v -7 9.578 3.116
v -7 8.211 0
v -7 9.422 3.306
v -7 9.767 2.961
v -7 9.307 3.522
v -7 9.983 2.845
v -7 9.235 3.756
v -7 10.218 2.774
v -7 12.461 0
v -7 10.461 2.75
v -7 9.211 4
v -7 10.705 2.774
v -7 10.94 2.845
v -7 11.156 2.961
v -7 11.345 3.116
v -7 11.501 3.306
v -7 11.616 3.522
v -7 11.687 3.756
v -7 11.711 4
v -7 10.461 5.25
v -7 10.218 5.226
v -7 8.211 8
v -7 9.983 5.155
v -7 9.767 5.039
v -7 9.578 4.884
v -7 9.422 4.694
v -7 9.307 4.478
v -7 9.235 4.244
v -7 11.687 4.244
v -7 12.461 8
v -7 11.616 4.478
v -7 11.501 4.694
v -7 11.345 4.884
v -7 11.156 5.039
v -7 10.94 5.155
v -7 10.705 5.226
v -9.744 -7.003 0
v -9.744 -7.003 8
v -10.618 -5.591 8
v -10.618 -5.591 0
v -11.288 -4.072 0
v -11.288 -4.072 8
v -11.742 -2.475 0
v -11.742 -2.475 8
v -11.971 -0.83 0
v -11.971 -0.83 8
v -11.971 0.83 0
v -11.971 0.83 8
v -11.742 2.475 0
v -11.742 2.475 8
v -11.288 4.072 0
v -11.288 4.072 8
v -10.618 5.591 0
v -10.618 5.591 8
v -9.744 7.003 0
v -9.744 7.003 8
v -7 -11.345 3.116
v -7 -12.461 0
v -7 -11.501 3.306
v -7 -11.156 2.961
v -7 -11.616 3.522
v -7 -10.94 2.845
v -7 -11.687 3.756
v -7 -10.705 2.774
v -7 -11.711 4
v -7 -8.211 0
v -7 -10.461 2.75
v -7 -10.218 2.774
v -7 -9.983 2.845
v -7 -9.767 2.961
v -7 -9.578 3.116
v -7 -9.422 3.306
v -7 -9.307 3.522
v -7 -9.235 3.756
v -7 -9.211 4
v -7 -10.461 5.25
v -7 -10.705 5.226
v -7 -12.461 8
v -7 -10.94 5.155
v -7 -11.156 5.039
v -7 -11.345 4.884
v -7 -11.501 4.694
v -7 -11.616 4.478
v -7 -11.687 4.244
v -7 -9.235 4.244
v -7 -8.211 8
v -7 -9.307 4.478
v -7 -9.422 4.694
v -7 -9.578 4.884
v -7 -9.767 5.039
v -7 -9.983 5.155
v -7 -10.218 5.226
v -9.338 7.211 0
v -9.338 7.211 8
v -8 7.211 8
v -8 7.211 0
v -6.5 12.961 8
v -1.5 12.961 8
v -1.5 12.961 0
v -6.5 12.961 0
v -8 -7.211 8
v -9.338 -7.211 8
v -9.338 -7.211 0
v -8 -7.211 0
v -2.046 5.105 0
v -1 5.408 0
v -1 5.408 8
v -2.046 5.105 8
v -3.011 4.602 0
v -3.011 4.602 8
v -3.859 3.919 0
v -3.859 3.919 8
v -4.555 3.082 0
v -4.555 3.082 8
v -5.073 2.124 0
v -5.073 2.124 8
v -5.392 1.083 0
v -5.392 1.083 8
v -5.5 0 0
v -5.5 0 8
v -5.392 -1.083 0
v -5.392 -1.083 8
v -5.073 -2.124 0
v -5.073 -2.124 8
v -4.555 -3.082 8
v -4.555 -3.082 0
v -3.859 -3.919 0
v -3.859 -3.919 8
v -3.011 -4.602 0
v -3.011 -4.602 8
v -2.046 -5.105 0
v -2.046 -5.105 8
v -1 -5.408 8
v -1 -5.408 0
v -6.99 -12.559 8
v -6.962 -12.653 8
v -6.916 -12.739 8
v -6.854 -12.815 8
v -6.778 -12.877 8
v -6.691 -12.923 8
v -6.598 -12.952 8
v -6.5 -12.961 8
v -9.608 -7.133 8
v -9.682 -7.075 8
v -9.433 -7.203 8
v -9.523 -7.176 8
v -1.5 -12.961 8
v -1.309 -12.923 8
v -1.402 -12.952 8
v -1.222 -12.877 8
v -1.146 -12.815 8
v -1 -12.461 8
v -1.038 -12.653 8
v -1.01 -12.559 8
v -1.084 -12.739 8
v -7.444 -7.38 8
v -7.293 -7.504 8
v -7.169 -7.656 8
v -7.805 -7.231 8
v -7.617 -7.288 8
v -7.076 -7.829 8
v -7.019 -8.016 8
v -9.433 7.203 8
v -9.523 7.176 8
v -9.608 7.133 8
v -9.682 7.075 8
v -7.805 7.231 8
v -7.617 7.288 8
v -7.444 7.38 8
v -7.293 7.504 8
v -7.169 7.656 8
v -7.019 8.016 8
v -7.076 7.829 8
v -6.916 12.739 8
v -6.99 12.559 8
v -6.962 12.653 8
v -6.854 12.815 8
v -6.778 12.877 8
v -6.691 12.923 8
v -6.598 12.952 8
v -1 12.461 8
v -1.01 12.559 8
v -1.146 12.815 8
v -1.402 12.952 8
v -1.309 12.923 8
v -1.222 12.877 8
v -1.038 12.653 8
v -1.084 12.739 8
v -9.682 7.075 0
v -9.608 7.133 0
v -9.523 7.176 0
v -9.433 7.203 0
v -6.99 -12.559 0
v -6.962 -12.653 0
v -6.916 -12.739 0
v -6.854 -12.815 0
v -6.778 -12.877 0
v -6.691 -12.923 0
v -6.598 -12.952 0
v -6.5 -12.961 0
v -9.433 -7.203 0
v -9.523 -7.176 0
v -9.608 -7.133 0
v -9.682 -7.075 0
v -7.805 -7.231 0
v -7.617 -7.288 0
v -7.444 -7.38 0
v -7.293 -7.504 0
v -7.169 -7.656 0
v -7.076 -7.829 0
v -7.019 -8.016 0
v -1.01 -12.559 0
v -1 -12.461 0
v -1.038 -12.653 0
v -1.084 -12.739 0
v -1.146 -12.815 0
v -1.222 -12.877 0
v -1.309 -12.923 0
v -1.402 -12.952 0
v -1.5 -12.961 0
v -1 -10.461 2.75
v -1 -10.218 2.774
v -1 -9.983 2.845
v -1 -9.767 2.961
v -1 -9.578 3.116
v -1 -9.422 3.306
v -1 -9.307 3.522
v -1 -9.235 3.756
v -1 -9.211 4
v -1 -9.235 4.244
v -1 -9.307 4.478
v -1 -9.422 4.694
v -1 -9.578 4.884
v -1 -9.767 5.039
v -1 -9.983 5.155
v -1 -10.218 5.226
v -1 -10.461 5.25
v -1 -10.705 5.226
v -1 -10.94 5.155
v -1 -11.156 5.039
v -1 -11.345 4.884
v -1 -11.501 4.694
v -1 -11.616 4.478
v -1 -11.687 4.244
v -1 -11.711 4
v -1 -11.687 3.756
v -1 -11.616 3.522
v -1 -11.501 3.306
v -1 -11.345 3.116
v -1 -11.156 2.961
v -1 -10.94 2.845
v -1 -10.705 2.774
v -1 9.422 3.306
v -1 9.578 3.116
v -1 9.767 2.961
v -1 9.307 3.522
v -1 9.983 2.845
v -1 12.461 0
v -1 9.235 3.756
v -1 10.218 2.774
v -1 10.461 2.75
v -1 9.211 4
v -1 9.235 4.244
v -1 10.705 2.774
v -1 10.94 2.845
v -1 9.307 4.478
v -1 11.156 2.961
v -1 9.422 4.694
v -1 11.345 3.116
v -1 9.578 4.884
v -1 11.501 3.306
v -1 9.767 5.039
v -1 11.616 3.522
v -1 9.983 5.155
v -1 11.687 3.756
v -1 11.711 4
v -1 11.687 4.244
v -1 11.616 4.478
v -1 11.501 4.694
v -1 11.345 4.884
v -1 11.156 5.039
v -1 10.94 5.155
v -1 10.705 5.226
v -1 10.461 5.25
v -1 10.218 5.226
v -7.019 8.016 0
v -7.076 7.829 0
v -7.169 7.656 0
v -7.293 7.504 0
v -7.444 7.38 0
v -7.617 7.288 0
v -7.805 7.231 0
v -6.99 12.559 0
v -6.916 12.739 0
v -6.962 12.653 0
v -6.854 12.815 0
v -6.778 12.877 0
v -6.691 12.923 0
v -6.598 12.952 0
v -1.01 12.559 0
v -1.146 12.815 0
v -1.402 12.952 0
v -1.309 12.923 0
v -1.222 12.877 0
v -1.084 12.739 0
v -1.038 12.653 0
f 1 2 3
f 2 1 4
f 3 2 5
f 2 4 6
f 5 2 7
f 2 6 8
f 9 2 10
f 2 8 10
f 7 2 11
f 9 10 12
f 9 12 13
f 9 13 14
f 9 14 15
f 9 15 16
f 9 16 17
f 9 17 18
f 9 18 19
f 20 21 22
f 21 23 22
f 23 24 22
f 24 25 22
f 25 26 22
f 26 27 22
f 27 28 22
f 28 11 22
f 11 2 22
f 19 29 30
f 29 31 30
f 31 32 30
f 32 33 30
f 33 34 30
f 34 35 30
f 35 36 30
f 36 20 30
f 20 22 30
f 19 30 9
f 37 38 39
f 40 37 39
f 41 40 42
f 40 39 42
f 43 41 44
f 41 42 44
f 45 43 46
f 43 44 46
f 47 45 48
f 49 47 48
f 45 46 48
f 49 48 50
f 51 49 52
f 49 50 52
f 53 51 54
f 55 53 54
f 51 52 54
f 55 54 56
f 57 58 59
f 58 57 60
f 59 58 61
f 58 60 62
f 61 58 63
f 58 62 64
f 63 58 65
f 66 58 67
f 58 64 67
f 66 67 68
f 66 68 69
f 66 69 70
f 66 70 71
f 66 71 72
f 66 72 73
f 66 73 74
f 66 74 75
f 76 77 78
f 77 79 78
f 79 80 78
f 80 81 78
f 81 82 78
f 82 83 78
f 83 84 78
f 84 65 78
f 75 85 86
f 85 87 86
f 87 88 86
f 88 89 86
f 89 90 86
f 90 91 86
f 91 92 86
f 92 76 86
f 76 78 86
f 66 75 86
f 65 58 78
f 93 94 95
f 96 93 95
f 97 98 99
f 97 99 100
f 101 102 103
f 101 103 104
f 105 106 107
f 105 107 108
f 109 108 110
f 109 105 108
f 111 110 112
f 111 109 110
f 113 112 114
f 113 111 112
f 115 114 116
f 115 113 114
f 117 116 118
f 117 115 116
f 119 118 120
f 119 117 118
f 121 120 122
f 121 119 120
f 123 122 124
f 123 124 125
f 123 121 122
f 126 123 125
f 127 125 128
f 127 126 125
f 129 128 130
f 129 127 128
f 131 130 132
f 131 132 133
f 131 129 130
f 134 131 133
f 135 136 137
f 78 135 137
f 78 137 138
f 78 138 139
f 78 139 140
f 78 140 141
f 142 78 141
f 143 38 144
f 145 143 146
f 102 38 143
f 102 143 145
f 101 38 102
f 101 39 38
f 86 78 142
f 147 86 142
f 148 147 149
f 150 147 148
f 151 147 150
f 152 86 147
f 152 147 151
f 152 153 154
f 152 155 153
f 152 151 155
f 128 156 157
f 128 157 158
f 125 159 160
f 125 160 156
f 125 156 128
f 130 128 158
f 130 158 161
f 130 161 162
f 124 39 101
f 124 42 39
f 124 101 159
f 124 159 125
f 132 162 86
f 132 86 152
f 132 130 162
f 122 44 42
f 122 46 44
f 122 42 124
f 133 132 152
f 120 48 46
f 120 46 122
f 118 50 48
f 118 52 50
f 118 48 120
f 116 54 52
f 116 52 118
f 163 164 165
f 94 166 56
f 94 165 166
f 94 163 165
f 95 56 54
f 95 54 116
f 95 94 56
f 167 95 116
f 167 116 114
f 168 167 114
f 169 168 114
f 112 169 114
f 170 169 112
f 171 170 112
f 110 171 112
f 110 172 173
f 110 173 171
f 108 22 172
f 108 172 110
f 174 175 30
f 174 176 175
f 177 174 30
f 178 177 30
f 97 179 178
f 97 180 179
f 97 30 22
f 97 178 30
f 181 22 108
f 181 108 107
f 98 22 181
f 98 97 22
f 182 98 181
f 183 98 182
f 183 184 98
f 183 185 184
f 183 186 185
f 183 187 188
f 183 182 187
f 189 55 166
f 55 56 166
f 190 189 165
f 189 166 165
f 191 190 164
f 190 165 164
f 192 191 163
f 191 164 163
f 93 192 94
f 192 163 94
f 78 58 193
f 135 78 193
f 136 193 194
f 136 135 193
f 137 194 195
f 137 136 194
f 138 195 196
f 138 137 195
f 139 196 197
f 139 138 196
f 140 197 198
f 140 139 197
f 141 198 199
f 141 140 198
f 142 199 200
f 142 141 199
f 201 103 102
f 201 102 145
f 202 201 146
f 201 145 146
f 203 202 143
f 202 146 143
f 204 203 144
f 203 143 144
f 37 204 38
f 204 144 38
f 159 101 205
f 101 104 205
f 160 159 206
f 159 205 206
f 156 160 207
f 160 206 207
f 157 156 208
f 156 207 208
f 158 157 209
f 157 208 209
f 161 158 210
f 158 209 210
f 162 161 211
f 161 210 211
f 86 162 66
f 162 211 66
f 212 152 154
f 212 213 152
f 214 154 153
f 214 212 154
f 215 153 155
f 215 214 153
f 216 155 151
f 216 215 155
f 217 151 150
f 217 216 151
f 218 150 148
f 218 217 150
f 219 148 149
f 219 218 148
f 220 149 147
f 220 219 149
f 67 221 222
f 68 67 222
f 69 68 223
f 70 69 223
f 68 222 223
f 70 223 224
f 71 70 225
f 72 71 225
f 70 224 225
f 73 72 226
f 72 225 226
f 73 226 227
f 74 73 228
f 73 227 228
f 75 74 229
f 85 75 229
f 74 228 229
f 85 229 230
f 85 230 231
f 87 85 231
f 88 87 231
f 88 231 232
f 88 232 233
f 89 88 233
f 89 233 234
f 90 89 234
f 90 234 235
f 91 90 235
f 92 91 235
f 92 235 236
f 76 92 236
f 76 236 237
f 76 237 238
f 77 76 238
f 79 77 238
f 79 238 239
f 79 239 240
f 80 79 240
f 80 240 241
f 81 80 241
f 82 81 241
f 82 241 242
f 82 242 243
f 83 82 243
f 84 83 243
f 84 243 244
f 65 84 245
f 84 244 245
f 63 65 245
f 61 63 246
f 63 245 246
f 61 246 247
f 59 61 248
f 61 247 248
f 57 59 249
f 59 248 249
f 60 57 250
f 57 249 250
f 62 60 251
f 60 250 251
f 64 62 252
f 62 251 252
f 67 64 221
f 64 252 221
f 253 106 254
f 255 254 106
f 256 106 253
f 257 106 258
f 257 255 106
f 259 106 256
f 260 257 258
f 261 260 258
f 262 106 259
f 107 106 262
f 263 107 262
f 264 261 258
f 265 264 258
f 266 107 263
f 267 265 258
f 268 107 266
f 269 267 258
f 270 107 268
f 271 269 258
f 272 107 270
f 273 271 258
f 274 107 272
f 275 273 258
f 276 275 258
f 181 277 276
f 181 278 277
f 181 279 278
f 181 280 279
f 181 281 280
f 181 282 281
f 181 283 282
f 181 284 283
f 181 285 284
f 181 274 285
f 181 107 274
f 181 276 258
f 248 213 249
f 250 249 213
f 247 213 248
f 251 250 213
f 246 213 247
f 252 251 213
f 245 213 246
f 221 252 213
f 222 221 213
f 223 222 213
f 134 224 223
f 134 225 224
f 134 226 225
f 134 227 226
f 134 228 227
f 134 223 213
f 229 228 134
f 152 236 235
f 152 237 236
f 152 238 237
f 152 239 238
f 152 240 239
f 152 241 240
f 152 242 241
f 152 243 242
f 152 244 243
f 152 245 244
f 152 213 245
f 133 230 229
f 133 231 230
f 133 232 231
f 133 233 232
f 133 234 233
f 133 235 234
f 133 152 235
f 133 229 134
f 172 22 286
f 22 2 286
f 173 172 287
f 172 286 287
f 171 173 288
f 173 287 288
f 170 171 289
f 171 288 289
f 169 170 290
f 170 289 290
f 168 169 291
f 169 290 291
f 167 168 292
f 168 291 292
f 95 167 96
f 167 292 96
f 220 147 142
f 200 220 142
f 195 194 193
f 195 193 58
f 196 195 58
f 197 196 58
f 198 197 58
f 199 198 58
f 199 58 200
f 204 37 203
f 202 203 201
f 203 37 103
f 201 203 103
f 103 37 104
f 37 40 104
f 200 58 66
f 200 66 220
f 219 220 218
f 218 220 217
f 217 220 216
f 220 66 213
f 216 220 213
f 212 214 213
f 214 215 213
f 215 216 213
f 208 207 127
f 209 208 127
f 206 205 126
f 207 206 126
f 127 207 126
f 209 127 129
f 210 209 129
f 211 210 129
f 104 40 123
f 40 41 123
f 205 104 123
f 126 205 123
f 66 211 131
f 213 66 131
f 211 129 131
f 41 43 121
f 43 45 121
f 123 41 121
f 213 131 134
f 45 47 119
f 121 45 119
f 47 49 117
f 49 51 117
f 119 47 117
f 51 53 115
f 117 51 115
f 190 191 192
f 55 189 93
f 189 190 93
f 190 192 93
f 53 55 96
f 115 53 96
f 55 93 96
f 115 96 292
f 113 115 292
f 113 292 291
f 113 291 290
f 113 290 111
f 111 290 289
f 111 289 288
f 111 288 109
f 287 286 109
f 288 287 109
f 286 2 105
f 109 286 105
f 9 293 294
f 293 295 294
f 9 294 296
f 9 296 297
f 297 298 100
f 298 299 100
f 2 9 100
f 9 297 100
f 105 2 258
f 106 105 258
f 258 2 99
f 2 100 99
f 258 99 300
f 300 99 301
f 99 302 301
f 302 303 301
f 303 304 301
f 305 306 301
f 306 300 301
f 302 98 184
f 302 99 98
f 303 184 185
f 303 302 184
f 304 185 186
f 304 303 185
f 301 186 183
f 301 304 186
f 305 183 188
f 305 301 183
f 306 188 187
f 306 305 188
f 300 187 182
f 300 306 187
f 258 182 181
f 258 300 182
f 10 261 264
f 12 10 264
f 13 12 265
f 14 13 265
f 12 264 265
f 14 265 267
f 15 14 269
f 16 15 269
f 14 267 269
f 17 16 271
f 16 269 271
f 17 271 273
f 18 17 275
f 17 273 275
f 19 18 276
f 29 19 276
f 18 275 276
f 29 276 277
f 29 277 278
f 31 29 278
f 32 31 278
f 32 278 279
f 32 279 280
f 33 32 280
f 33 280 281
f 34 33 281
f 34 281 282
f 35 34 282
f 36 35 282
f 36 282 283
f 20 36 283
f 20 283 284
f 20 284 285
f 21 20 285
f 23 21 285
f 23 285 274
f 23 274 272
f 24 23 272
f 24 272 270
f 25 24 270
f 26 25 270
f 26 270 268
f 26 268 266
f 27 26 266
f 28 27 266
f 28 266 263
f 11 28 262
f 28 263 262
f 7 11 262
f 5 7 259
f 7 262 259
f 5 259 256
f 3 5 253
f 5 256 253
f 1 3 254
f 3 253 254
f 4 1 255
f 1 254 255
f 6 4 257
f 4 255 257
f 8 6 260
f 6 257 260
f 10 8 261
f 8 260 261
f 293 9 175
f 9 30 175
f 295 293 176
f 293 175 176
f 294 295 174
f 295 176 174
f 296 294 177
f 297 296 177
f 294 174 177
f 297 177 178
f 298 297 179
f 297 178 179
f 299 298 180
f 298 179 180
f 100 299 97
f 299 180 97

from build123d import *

# Parameters (mm, degrees)
ESQUISSE1_R             = 13
ESQUISSE1_R_2           = 5.5
BOSS_EXTRU_1_DEPTH      = 8
ESQUISSE2_W             = 32.31004566
ESQUISSE2_H             = 49.818141682
ENL_V_MAT_EXTRU_1_DEPTH = 8
ESQUISSE3_R             = 1.5
ENL_V_MAT_EXTRU_2_DEPTH = 8
ESQUISSE4_W             = 21.87123002
ESQUISSE4_H             = 13.833010023
ESQUISSE4_W_2           = 20.432073676
ESQUISSE4_H_2           = 10.309386407
ENL_V_MAT_EXTRU_3_DEPTH = 8
ENL_V_MAT_EXTRU_4_DEPTH = 8
CONG_4_R                = 0.5
ESQUISSE7_W             = 6
ESQUISSE7_H             = 5.75
BOSS_EXTRU_3_DEPTH      = 8
ESQUISSE11_R            = 1.25
ENL_V_MAT_EXTRU_5_DEPTH = 8
CONG_5_R                = 0.5
CONG_6_R                = 1
CONG_7_R                = 0.5


with BuildPart() as part:
    # Esquisse1 → Boss.-Extru.1 (new body)
    with BuildSketch(Plane.XY):
        Circle(ESQUISSE1_R)
        Circle(ESQUISSE1_R_2, mode=Mode.SUBTRACT)
    extrude(amount=BOSS_EXTRU_1_DEPTH)

    # Esquisse2 → Enlèv. mat.-Extru.1 (cut)
    with BuildSketch(Plane.XY.offset(8)):
        with Locations((15.15502283, -0.665904075)):
            Rectangle(ESQUISSE2_W, ESQUISSE2_H)
    extrude(amount=-ENL_V_MAT_EXTRU_1_DEPTH, mode=Mode.SUBTRACT)

    # Esquisse3 → Enlèv. mat.-Extru.2 (cut)
    with BuildSketch(Plane(origin=(-1, 0, 0), x_dir=(0, 0, -1), z_dir=(1, 0, 0))):
        with Locations((-4, 10.461481397)):
            Circle(ESQUISSE3_R)
        with Locations((-4, -10.461481397)):
            Circle(ESQUISSE3_R)
    extrude(amount=-ENL_V_MAT_EXTRU_2_DEPTH, mode=Mode.SUBTRACT)

    # Esquisse4 → Enlèv. mat.-Extru.3 (cut)
    with BuildSketch(Plane.XY.offset(8)):
        with Locations((-17.93561501, 14.127986408)):
            Rectangle(ESQUISSE4_W, ESQUISSE4_H)
        with Locations((-17.216036838, -12.366174601)):
            Rectangle(ESQUISSE4_W_2, ESQUISSE4_H_2)
    extrude(amount=-ENL_V_MAT_EXTRU_3_DEPTH, mode=Mode.SUBTRACT)

    # Esquisse6 → Enlèv. mat.-Extru.4 (cut)
    with BuildSketch(Plane.XY.offset(8)):
        with BuildLine():
            Line((-16.733633374, -12.244867556), (-8.177661786, -8.782132299))
            ThreePointArc((-8.177661786, -8.782132299), (-11.997254104, 0.256698201), (-7.794537354, 9.123880065))
            Line((-7.794537354, 9.123880065), (-13.177897042, 8.696922023))
            ThreePointArc((-13.177897042, 8.696922023), (-19.765548318, -0.95731283), (-16.733633374, -12.244867556))
        make_face()
    extrude(amount=-ENL_V_MAT_EXTRU_4_DEPTH, mode=Mode.SUBTRACT)

    # Congé4
    cong_4_edges = [part.edges().sort_by_distance(p)[0] for p in [
        (-9.591378215, 7.211481397, 4),
        (-9.591378215, -7.211481397, 4),
    ]]
    fillet(cong_4_edges, radius=CONG_4_R)

    # Esquisse7 → Boss.-Extru.3 (add)
    with BuildSketch(Plane(origin=(0, 0, 0), x_dir=(-1, 0, 0), z_dir=(0, 0, -1))):
        with Locations((4, 10.086481397)):
            Rectangle(ESQUISSE7_W, ESQUISSE7_H)
        with Locations((4, -10.086481397)):
            Rectangle(ESQUISSE7_W, ESQUISSE7_H)
    extrude(amount=-BOSS_EXTRU_3_DEPTH)

    # Esquisse11 → Enlèv. mat.-Extru.5 (cut)
    with BuildSketch(Plane(origin=(-1, 0, 0), x_dir=(0, 0, -1), z_dir=(1, 0, 0))):
        with Locations((-4, 10.461481397)):
            Circle(ESQUISSE11_R)
        with Locations((-4, -10.461481397)):
            Circle(ESQUISSE11_R)
    extrude(amount=-ENL_V_MAT_EXTRU_5_DEPTH, mode=Mode.SUBTRACT)

    # Congé5
    cong_5_edges = [part.edges().sort_by_distance(p)[0] for p in [
        (-7, 12.961481397, 4),
        (-7, -12.961481397, 4),
    ]]
    fillet(cong_5_edges, radius=CONG_5_R)

    # Congé6
    cong_6_edges = [part.edges().sort_by_distance(p)[0] for p in [
        (-7, 7.211481397, 4),
        (-7, -7.211481397, 4),
    ]]
    fillet(cong_6_edges, radius=CONG_6_R)

    # Congé7
    cong_7_edges = [part.edges().sort_by_distance(p)[0] for p in [
        (-1, 12.961481397, 4),
        (-1, -12.961481397, 4),
    ]]
    fillet(cong_7_edges, radius=CONG_7_R)


solid = part.part
